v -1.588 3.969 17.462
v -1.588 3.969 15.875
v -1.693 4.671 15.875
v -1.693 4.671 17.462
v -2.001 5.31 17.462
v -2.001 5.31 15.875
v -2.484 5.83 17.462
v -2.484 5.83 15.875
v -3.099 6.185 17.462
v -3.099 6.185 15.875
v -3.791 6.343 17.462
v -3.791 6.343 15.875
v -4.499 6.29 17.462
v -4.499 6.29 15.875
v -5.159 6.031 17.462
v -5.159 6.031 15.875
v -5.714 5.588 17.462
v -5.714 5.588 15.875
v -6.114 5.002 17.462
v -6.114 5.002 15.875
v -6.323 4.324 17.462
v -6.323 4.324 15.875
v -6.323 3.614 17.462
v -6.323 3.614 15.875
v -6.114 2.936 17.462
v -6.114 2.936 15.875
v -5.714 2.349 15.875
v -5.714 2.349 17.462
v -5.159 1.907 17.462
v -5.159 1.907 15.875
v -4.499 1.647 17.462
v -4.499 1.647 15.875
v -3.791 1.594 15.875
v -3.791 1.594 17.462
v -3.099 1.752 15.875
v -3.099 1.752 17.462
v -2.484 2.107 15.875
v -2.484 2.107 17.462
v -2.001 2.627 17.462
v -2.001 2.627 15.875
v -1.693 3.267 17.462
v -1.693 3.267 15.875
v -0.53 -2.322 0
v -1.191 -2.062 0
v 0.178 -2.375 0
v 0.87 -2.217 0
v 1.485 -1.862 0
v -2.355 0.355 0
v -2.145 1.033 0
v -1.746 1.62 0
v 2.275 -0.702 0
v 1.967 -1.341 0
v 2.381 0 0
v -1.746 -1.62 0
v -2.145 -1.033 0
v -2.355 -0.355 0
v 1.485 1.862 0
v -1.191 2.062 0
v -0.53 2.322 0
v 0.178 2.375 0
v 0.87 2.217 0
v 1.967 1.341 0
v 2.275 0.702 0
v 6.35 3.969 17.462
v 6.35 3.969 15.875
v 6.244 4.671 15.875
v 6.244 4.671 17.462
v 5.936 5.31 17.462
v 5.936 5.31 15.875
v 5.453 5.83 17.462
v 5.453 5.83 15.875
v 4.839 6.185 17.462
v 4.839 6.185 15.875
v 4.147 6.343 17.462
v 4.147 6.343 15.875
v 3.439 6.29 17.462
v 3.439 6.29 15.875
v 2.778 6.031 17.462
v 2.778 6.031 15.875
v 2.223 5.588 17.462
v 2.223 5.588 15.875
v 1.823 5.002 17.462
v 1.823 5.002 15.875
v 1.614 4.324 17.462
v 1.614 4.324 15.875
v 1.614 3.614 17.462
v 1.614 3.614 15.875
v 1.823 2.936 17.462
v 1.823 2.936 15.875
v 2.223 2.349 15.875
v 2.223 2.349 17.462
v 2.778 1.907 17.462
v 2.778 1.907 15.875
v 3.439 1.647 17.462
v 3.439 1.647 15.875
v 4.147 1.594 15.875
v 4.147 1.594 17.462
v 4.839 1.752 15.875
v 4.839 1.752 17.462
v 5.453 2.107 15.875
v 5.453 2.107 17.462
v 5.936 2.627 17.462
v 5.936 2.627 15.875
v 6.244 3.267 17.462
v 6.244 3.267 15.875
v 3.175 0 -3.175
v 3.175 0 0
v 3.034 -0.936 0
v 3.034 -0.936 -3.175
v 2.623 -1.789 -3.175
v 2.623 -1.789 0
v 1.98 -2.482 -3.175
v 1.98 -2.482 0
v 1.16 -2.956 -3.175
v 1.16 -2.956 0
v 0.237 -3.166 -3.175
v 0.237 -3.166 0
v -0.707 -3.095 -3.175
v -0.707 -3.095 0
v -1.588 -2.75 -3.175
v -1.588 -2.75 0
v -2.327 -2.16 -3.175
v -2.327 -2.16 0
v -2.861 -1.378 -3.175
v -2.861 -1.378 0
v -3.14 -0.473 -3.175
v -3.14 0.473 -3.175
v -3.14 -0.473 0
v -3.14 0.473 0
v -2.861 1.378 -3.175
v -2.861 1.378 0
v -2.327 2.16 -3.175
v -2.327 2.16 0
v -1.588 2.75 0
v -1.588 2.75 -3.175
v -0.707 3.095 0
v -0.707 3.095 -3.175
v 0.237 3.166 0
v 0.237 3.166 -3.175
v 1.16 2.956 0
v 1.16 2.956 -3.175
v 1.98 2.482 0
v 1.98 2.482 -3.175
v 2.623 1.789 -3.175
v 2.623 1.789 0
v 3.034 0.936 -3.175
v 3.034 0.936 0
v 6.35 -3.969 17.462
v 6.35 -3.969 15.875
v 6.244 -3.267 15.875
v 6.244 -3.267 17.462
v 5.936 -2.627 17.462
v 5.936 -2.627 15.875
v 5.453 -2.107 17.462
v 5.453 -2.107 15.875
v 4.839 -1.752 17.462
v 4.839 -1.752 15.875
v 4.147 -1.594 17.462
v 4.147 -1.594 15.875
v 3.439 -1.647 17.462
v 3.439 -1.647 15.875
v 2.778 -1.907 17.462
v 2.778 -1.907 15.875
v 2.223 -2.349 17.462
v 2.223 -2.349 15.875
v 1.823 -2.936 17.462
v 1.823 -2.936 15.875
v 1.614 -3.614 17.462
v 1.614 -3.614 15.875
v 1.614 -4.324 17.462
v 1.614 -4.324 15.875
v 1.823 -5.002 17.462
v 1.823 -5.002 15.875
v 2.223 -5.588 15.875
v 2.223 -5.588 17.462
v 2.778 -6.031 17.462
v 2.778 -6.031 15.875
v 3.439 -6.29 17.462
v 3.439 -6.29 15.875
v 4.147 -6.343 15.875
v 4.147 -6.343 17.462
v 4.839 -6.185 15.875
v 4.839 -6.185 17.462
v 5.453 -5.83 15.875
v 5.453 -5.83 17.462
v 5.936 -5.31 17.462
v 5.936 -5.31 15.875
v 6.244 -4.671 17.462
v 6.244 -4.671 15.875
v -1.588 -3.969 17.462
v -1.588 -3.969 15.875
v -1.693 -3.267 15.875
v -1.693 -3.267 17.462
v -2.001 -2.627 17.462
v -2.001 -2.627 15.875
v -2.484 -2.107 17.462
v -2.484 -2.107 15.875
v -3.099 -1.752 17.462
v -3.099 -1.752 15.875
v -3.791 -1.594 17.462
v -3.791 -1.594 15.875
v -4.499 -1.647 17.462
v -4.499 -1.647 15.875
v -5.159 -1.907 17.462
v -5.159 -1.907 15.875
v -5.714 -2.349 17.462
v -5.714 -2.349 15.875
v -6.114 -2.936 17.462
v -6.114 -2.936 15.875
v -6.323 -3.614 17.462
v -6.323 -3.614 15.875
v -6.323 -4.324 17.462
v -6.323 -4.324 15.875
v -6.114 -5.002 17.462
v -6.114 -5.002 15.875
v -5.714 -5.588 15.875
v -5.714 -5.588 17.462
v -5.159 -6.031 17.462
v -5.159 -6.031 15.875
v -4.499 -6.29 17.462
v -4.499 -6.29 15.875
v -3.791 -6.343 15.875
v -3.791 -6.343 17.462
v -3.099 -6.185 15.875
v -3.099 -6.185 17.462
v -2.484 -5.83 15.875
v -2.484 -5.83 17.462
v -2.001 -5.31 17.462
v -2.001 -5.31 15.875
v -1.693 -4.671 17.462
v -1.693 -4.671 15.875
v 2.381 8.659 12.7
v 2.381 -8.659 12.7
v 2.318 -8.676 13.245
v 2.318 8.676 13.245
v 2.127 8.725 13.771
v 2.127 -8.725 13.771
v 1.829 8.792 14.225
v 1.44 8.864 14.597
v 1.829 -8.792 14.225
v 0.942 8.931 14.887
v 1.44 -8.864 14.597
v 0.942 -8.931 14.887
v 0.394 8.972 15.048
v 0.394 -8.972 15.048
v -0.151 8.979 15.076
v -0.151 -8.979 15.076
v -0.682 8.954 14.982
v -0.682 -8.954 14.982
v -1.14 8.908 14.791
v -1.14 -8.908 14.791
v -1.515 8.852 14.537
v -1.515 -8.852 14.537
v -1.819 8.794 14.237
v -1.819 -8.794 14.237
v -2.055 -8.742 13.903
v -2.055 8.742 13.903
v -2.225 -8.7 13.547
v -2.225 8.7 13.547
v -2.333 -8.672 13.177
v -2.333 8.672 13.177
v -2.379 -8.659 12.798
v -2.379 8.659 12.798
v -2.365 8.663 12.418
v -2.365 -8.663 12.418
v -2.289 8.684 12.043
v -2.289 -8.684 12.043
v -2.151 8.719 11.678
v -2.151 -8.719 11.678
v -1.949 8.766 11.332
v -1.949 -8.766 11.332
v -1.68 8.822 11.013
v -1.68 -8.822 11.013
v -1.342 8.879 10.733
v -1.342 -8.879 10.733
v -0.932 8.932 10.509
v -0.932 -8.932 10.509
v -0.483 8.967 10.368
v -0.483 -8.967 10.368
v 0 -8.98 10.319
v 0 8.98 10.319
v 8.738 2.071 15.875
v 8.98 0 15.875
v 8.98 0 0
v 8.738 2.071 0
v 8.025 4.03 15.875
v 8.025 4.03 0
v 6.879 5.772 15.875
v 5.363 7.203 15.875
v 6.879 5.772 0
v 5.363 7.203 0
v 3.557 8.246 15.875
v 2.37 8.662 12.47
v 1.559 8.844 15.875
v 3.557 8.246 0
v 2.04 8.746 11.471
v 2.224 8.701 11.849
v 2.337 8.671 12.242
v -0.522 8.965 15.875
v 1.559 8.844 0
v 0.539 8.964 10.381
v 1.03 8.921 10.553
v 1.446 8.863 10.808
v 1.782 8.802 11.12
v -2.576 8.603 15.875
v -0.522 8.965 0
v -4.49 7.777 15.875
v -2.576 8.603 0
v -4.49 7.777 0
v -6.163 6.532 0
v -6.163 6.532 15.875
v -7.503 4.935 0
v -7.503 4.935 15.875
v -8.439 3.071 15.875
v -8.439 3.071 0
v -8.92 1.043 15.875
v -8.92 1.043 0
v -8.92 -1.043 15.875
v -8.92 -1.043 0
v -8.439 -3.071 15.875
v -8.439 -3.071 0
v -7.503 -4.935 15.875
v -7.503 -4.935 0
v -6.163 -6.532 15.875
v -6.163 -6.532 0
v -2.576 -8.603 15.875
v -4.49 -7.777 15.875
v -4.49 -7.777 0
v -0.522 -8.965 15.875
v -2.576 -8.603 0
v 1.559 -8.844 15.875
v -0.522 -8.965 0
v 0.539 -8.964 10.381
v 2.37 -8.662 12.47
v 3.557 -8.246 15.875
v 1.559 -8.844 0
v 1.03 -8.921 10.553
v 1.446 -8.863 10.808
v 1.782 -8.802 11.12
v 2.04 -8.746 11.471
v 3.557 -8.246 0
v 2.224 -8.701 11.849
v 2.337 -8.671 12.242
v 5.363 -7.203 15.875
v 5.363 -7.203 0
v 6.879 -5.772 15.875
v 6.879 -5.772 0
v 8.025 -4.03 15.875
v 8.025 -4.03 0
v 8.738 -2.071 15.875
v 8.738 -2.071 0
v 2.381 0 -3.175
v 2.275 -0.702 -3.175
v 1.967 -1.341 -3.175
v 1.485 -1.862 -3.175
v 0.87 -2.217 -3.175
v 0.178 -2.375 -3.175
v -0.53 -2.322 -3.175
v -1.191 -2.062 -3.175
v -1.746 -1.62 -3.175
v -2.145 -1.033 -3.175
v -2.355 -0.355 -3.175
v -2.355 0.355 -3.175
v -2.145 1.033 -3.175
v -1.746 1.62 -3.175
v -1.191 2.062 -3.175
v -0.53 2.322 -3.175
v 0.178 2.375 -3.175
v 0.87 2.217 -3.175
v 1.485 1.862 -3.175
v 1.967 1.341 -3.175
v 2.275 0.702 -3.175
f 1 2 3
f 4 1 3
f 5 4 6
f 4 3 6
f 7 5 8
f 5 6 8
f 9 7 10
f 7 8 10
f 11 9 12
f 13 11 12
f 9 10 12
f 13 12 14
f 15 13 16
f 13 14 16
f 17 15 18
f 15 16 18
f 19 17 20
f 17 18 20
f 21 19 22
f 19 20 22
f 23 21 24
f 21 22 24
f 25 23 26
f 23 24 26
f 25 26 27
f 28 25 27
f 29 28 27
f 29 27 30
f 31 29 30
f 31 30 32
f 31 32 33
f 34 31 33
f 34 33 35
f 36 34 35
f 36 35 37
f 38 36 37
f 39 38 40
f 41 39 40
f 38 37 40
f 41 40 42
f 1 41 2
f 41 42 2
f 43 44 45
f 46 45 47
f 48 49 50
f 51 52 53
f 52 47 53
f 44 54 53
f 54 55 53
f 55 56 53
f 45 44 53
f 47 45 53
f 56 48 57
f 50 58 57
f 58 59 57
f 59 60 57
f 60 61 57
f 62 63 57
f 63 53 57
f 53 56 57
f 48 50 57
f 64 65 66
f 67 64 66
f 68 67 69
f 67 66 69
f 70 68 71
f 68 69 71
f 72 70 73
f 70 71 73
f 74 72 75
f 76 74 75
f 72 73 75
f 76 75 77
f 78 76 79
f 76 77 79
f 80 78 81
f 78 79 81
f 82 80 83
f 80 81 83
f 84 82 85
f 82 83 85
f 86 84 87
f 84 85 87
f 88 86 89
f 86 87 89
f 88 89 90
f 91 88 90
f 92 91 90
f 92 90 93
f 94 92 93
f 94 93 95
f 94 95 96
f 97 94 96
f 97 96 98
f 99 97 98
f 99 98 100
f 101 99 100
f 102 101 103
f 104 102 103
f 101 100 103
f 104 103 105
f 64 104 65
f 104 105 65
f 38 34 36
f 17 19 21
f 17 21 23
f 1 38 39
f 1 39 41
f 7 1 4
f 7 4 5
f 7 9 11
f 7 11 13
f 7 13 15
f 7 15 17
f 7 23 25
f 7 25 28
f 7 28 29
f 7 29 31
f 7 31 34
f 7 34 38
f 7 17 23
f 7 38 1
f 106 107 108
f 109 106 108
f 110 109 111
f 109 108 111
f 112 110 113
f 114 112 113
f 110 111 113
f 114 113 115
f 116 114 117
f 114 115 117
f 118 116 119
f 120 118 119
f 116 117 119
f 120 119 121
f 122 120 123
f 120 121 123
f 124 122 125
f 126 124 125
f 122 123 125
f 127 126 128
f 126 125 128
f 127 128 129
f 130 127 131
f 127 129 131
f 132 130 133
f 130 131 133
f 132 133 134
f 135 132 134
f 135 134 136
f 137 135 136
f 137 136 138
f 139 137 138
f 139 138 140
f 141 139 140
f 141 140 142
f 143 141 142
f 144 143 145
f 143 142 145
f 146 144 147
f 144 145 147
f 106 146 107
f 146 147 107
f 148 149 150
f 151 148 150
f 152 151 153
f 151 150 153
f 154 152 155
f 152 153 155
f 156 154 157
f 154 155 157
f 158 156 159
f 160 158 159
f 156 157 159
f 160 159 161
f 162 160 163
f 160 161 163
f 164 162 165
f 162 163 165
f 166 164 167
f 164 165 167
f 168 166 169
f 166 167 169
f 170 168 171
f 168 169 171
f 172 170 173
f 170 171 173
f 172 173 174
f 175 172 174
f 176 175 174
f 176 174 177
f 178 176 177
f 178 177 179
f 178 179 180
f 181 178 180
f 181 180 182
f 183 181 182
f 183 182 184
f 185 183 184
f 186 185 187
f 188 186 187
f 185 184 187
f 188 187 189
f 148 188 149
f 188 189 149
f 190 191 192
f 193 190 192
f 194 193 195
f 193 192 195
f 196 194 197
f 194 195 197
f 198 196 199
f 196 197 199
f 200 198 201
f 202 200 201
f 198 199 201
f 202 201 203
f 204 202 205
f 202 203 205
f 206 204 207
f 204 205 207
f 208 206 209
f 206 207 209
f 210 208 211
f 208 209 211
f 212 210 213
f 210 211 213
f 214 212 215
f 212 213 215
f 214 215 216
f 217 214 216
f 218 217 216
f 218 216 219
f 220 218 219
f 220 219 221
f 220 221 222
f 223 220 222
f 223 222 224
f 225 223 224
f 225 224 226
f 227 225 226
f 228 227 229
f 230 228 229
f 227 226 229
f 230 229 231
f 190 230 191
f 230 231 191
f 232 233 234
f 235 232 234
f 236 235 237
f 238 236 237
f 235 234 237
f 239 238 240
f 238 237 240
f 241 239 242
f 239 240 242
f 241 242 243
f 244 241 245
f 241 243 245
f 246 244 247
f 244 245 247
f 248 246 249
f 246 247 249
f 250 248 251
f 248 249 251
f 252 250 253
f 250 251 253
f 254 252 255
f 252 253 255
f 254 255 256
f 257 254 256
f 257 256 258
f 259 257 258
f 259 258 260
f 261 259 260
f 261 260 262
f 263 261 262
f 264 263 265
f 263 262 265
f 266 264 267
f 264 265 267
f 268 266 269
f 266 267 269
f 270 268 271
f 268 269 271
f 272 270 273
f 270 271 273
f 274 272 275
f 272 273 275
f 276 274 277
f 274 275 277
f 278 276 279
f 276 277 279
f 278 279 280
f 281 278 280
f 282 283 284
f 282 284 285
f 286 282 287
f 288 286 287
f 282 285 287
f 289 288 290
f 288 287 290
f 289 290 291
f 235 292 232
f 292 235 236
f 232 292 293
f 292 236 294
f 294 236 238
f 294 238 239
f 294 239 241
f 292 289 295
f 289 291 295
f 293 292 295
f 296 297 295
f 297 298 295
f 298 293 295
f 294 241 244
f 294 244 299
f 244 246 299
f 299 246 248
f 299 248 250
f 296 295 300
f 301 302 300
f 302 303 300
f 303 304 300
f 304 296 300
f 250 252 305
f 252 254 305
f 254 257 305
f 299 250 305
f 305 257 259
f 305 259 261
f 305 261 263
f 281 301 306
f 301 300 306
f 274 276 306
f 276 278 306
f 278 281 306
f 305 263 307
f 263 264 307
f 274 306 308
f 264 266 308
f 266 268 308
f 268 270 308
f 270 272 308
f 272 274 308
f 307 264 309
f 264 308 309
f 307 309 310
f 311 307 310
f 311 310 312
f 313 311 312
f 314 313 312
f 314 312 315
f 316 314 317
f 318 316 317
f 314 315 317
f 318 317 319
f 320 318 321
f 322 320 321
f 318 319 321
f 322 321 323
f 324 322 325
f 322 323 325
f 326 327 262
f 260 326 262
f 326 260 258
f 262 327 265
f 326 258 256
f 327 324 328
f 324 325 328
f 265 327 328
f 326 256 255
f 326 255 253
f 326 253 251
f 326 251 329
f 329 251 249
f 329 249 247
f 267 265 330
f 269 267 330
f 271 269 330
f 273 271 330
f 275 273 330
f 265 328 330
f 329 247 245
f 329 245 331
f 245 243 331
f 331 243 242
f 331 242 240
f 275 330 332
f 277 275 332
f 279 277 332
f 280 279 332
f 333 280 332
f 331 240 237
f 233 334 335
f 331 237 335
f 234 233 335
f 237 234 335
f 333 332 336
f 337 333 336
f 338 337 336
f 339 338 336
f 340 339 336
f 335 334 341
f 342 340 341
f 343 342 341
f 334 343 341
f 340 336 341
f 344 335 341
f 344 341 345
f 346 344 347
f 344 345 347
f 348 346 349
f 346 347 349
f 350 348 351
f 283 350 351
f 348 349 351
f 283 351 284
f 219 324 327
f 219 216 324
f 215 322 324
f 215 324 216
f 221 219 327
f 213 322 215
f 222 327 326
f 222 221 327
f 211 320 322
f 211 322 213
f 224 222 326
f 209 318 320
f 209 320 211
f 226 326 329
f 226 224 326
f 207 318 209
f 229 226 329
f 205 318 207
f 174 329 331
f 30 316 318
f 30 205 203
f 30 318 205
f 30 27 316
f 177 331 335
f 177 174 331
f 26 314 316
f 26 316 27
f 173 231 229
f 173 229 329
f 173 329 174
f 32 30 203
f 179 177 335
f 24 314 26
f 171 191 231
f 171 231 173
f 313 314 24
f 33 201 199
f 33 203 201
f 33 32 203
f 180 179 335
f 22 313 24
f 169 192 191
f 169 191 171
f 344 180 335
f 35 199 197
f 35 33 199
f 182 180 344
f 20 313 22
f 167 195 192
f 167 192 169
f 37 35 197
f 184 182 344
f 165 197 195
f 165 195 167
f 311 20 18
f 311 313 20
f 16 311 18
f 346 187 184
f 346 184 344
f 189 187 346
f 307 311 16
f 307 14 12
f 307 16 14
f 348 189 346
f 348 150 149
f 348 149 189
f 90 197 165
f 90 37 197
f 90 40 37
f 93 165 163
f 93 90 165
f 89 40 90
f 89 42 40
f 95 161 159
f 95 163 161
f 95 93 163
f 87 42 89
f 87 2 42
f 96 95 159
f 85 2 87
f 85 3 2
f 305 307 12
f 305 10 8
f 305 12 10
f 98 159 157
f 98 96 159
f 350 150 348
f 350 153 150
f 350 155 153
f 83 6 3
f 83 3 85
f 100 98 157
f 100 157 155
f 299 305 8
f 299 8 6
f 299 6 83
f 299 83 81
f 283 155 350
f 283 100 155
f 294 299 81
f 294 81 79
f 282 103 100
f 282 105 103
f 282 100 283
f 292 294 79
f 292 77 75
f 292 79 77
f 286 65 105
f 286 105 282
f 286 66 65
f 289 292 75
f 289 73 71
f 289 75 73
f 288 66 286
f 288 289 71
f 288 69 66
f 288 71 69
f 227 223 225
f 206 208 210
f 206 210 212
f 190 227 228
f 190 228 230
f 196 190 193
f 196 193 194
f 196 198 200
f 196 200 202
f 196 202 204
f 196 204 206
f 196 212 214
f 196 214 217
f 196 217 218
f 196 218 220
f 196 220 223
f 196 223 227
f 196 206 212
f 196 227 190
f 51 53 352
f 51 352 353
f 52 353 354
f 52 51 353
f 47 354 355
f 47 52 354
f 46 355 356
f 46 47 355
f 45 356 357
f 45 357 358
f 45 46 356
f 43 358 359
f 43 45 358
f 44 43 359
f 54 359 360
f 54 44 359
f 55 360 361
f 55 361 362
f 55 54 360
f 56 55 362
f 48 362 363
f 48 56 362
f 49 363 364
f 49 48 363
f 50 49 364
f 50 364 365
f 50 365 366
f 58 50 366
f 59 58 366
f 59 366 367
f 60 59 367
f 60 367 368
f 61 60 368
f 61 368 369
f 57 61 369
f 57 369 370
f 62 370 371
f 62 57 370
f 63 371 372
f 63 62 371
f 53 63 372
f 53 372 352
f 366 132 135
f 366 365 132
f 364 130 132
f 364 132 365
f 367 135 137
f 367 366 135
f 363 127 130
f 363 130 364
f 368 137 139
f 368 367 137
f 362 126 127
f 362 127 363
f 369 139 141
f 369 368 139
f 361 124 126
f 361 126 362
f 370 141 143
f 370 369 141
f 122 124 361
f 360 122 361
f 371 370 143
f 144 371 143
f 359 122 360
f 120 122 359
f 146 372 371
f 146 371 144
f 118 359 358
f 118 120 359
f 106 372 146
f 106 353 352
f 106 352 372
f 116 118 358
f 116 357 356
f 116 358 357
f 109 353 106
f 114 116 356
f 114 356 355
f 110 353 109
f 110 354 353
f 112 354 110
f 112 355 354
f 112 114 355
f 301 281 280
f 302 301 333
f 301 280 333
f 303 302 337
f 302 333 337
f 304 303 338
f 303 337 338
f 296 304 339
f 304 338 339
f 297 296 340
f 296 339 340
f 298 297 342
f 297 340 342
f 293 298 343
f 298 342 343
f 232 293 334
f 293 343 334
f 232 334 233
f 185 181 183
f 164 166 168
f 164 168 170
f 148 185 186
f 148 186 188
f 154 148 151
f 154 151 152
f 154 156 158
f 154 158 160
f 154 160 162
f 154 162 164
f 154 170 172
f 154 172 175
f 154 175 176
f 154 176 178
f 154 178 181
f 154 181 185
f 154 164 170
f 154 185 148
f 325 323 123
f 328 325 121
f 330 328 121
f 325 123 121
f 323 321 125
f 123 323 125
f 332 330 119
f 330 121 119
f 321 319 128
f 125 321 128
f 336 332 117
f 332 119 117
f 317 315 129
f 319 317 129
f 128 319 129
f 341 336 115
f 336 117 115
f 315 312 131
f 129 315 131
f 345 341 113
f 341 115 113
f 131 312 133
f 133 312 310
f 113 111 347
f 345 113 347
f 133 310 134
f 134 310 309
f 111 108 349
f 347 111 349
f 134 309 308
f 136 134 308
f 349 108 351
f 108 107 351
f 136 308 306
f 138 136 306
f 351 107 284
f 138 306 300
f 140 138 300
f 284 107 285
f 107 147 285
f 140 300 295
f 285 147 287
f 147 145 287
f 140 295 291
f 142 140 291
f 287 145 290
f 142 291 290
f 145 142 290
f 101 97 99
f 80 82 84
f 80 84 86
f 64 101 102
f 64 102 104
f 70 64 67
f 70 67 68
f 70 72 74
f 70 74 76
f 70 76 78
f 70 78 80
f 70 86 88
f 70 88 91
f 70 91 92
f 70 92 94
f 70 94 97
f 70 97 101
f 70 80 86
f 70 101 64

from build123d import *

# Parameters (mm, degrees)
F0_R     = 8.980256
F1_DEPTH = 15.875
F2_R     = 3.175
F2_R_2   = 2.38125
F3_DEPTH = 3.175
F4_R     = 2.38125
F5_DEPTH = 1.5875
F7_DEPTH = 12.7


with BuildPart() as f1:
    # F0 (on Top) → F1 (new body)
    with BuildSketch(Plane.XY):
        Circle(F0_R)
    extrude(amount=F1_DEPTH)

    # F2 (on face) → F3 (join)
    with BuildSketch(Plane(origin=(0, 0, 0), x_dir=(1, 0, 0), z_dir=(0, 0, -1))):
        Circle(F2_R)
        Circle(F2_R_2, mode=Mode.SUBTRACT)
    extrude(amount=F3_DEPTH)

    # F4 (on face) → F5 (join)
    with BuildSketch(Plane.XY.offset(15.875)):
        with Locations((-3.96875, 3.96875)):
            Circle(F4_R)
        with Locations((3.96875, 3.96875)):
            Circle(F4_R)
        with Locations((3.96875, -3.96875)):
            Circle(F4_R)
        with Locations((-3.96875, -3.96875)):
            Circle(F4_R)
    extrude(amount=F5_DEPTH)

    # F6 (on Front) → F7 (cut, symmetric)
    with BuildSketch(Plane.XZ):
        with BuildLine():
            ThreePointArc((0, 10.31875), (1.683798, 11.016202), (2.38125, 12.7))
            ThreePointArc((2.38125, 12.7), (-1.683798, 14.383798), (0, 10.31875))
        make_face()
    extrude(amount=F7_DEPTH, both=True, mode=Mode.SUBTRACT)


solid = f1.part
